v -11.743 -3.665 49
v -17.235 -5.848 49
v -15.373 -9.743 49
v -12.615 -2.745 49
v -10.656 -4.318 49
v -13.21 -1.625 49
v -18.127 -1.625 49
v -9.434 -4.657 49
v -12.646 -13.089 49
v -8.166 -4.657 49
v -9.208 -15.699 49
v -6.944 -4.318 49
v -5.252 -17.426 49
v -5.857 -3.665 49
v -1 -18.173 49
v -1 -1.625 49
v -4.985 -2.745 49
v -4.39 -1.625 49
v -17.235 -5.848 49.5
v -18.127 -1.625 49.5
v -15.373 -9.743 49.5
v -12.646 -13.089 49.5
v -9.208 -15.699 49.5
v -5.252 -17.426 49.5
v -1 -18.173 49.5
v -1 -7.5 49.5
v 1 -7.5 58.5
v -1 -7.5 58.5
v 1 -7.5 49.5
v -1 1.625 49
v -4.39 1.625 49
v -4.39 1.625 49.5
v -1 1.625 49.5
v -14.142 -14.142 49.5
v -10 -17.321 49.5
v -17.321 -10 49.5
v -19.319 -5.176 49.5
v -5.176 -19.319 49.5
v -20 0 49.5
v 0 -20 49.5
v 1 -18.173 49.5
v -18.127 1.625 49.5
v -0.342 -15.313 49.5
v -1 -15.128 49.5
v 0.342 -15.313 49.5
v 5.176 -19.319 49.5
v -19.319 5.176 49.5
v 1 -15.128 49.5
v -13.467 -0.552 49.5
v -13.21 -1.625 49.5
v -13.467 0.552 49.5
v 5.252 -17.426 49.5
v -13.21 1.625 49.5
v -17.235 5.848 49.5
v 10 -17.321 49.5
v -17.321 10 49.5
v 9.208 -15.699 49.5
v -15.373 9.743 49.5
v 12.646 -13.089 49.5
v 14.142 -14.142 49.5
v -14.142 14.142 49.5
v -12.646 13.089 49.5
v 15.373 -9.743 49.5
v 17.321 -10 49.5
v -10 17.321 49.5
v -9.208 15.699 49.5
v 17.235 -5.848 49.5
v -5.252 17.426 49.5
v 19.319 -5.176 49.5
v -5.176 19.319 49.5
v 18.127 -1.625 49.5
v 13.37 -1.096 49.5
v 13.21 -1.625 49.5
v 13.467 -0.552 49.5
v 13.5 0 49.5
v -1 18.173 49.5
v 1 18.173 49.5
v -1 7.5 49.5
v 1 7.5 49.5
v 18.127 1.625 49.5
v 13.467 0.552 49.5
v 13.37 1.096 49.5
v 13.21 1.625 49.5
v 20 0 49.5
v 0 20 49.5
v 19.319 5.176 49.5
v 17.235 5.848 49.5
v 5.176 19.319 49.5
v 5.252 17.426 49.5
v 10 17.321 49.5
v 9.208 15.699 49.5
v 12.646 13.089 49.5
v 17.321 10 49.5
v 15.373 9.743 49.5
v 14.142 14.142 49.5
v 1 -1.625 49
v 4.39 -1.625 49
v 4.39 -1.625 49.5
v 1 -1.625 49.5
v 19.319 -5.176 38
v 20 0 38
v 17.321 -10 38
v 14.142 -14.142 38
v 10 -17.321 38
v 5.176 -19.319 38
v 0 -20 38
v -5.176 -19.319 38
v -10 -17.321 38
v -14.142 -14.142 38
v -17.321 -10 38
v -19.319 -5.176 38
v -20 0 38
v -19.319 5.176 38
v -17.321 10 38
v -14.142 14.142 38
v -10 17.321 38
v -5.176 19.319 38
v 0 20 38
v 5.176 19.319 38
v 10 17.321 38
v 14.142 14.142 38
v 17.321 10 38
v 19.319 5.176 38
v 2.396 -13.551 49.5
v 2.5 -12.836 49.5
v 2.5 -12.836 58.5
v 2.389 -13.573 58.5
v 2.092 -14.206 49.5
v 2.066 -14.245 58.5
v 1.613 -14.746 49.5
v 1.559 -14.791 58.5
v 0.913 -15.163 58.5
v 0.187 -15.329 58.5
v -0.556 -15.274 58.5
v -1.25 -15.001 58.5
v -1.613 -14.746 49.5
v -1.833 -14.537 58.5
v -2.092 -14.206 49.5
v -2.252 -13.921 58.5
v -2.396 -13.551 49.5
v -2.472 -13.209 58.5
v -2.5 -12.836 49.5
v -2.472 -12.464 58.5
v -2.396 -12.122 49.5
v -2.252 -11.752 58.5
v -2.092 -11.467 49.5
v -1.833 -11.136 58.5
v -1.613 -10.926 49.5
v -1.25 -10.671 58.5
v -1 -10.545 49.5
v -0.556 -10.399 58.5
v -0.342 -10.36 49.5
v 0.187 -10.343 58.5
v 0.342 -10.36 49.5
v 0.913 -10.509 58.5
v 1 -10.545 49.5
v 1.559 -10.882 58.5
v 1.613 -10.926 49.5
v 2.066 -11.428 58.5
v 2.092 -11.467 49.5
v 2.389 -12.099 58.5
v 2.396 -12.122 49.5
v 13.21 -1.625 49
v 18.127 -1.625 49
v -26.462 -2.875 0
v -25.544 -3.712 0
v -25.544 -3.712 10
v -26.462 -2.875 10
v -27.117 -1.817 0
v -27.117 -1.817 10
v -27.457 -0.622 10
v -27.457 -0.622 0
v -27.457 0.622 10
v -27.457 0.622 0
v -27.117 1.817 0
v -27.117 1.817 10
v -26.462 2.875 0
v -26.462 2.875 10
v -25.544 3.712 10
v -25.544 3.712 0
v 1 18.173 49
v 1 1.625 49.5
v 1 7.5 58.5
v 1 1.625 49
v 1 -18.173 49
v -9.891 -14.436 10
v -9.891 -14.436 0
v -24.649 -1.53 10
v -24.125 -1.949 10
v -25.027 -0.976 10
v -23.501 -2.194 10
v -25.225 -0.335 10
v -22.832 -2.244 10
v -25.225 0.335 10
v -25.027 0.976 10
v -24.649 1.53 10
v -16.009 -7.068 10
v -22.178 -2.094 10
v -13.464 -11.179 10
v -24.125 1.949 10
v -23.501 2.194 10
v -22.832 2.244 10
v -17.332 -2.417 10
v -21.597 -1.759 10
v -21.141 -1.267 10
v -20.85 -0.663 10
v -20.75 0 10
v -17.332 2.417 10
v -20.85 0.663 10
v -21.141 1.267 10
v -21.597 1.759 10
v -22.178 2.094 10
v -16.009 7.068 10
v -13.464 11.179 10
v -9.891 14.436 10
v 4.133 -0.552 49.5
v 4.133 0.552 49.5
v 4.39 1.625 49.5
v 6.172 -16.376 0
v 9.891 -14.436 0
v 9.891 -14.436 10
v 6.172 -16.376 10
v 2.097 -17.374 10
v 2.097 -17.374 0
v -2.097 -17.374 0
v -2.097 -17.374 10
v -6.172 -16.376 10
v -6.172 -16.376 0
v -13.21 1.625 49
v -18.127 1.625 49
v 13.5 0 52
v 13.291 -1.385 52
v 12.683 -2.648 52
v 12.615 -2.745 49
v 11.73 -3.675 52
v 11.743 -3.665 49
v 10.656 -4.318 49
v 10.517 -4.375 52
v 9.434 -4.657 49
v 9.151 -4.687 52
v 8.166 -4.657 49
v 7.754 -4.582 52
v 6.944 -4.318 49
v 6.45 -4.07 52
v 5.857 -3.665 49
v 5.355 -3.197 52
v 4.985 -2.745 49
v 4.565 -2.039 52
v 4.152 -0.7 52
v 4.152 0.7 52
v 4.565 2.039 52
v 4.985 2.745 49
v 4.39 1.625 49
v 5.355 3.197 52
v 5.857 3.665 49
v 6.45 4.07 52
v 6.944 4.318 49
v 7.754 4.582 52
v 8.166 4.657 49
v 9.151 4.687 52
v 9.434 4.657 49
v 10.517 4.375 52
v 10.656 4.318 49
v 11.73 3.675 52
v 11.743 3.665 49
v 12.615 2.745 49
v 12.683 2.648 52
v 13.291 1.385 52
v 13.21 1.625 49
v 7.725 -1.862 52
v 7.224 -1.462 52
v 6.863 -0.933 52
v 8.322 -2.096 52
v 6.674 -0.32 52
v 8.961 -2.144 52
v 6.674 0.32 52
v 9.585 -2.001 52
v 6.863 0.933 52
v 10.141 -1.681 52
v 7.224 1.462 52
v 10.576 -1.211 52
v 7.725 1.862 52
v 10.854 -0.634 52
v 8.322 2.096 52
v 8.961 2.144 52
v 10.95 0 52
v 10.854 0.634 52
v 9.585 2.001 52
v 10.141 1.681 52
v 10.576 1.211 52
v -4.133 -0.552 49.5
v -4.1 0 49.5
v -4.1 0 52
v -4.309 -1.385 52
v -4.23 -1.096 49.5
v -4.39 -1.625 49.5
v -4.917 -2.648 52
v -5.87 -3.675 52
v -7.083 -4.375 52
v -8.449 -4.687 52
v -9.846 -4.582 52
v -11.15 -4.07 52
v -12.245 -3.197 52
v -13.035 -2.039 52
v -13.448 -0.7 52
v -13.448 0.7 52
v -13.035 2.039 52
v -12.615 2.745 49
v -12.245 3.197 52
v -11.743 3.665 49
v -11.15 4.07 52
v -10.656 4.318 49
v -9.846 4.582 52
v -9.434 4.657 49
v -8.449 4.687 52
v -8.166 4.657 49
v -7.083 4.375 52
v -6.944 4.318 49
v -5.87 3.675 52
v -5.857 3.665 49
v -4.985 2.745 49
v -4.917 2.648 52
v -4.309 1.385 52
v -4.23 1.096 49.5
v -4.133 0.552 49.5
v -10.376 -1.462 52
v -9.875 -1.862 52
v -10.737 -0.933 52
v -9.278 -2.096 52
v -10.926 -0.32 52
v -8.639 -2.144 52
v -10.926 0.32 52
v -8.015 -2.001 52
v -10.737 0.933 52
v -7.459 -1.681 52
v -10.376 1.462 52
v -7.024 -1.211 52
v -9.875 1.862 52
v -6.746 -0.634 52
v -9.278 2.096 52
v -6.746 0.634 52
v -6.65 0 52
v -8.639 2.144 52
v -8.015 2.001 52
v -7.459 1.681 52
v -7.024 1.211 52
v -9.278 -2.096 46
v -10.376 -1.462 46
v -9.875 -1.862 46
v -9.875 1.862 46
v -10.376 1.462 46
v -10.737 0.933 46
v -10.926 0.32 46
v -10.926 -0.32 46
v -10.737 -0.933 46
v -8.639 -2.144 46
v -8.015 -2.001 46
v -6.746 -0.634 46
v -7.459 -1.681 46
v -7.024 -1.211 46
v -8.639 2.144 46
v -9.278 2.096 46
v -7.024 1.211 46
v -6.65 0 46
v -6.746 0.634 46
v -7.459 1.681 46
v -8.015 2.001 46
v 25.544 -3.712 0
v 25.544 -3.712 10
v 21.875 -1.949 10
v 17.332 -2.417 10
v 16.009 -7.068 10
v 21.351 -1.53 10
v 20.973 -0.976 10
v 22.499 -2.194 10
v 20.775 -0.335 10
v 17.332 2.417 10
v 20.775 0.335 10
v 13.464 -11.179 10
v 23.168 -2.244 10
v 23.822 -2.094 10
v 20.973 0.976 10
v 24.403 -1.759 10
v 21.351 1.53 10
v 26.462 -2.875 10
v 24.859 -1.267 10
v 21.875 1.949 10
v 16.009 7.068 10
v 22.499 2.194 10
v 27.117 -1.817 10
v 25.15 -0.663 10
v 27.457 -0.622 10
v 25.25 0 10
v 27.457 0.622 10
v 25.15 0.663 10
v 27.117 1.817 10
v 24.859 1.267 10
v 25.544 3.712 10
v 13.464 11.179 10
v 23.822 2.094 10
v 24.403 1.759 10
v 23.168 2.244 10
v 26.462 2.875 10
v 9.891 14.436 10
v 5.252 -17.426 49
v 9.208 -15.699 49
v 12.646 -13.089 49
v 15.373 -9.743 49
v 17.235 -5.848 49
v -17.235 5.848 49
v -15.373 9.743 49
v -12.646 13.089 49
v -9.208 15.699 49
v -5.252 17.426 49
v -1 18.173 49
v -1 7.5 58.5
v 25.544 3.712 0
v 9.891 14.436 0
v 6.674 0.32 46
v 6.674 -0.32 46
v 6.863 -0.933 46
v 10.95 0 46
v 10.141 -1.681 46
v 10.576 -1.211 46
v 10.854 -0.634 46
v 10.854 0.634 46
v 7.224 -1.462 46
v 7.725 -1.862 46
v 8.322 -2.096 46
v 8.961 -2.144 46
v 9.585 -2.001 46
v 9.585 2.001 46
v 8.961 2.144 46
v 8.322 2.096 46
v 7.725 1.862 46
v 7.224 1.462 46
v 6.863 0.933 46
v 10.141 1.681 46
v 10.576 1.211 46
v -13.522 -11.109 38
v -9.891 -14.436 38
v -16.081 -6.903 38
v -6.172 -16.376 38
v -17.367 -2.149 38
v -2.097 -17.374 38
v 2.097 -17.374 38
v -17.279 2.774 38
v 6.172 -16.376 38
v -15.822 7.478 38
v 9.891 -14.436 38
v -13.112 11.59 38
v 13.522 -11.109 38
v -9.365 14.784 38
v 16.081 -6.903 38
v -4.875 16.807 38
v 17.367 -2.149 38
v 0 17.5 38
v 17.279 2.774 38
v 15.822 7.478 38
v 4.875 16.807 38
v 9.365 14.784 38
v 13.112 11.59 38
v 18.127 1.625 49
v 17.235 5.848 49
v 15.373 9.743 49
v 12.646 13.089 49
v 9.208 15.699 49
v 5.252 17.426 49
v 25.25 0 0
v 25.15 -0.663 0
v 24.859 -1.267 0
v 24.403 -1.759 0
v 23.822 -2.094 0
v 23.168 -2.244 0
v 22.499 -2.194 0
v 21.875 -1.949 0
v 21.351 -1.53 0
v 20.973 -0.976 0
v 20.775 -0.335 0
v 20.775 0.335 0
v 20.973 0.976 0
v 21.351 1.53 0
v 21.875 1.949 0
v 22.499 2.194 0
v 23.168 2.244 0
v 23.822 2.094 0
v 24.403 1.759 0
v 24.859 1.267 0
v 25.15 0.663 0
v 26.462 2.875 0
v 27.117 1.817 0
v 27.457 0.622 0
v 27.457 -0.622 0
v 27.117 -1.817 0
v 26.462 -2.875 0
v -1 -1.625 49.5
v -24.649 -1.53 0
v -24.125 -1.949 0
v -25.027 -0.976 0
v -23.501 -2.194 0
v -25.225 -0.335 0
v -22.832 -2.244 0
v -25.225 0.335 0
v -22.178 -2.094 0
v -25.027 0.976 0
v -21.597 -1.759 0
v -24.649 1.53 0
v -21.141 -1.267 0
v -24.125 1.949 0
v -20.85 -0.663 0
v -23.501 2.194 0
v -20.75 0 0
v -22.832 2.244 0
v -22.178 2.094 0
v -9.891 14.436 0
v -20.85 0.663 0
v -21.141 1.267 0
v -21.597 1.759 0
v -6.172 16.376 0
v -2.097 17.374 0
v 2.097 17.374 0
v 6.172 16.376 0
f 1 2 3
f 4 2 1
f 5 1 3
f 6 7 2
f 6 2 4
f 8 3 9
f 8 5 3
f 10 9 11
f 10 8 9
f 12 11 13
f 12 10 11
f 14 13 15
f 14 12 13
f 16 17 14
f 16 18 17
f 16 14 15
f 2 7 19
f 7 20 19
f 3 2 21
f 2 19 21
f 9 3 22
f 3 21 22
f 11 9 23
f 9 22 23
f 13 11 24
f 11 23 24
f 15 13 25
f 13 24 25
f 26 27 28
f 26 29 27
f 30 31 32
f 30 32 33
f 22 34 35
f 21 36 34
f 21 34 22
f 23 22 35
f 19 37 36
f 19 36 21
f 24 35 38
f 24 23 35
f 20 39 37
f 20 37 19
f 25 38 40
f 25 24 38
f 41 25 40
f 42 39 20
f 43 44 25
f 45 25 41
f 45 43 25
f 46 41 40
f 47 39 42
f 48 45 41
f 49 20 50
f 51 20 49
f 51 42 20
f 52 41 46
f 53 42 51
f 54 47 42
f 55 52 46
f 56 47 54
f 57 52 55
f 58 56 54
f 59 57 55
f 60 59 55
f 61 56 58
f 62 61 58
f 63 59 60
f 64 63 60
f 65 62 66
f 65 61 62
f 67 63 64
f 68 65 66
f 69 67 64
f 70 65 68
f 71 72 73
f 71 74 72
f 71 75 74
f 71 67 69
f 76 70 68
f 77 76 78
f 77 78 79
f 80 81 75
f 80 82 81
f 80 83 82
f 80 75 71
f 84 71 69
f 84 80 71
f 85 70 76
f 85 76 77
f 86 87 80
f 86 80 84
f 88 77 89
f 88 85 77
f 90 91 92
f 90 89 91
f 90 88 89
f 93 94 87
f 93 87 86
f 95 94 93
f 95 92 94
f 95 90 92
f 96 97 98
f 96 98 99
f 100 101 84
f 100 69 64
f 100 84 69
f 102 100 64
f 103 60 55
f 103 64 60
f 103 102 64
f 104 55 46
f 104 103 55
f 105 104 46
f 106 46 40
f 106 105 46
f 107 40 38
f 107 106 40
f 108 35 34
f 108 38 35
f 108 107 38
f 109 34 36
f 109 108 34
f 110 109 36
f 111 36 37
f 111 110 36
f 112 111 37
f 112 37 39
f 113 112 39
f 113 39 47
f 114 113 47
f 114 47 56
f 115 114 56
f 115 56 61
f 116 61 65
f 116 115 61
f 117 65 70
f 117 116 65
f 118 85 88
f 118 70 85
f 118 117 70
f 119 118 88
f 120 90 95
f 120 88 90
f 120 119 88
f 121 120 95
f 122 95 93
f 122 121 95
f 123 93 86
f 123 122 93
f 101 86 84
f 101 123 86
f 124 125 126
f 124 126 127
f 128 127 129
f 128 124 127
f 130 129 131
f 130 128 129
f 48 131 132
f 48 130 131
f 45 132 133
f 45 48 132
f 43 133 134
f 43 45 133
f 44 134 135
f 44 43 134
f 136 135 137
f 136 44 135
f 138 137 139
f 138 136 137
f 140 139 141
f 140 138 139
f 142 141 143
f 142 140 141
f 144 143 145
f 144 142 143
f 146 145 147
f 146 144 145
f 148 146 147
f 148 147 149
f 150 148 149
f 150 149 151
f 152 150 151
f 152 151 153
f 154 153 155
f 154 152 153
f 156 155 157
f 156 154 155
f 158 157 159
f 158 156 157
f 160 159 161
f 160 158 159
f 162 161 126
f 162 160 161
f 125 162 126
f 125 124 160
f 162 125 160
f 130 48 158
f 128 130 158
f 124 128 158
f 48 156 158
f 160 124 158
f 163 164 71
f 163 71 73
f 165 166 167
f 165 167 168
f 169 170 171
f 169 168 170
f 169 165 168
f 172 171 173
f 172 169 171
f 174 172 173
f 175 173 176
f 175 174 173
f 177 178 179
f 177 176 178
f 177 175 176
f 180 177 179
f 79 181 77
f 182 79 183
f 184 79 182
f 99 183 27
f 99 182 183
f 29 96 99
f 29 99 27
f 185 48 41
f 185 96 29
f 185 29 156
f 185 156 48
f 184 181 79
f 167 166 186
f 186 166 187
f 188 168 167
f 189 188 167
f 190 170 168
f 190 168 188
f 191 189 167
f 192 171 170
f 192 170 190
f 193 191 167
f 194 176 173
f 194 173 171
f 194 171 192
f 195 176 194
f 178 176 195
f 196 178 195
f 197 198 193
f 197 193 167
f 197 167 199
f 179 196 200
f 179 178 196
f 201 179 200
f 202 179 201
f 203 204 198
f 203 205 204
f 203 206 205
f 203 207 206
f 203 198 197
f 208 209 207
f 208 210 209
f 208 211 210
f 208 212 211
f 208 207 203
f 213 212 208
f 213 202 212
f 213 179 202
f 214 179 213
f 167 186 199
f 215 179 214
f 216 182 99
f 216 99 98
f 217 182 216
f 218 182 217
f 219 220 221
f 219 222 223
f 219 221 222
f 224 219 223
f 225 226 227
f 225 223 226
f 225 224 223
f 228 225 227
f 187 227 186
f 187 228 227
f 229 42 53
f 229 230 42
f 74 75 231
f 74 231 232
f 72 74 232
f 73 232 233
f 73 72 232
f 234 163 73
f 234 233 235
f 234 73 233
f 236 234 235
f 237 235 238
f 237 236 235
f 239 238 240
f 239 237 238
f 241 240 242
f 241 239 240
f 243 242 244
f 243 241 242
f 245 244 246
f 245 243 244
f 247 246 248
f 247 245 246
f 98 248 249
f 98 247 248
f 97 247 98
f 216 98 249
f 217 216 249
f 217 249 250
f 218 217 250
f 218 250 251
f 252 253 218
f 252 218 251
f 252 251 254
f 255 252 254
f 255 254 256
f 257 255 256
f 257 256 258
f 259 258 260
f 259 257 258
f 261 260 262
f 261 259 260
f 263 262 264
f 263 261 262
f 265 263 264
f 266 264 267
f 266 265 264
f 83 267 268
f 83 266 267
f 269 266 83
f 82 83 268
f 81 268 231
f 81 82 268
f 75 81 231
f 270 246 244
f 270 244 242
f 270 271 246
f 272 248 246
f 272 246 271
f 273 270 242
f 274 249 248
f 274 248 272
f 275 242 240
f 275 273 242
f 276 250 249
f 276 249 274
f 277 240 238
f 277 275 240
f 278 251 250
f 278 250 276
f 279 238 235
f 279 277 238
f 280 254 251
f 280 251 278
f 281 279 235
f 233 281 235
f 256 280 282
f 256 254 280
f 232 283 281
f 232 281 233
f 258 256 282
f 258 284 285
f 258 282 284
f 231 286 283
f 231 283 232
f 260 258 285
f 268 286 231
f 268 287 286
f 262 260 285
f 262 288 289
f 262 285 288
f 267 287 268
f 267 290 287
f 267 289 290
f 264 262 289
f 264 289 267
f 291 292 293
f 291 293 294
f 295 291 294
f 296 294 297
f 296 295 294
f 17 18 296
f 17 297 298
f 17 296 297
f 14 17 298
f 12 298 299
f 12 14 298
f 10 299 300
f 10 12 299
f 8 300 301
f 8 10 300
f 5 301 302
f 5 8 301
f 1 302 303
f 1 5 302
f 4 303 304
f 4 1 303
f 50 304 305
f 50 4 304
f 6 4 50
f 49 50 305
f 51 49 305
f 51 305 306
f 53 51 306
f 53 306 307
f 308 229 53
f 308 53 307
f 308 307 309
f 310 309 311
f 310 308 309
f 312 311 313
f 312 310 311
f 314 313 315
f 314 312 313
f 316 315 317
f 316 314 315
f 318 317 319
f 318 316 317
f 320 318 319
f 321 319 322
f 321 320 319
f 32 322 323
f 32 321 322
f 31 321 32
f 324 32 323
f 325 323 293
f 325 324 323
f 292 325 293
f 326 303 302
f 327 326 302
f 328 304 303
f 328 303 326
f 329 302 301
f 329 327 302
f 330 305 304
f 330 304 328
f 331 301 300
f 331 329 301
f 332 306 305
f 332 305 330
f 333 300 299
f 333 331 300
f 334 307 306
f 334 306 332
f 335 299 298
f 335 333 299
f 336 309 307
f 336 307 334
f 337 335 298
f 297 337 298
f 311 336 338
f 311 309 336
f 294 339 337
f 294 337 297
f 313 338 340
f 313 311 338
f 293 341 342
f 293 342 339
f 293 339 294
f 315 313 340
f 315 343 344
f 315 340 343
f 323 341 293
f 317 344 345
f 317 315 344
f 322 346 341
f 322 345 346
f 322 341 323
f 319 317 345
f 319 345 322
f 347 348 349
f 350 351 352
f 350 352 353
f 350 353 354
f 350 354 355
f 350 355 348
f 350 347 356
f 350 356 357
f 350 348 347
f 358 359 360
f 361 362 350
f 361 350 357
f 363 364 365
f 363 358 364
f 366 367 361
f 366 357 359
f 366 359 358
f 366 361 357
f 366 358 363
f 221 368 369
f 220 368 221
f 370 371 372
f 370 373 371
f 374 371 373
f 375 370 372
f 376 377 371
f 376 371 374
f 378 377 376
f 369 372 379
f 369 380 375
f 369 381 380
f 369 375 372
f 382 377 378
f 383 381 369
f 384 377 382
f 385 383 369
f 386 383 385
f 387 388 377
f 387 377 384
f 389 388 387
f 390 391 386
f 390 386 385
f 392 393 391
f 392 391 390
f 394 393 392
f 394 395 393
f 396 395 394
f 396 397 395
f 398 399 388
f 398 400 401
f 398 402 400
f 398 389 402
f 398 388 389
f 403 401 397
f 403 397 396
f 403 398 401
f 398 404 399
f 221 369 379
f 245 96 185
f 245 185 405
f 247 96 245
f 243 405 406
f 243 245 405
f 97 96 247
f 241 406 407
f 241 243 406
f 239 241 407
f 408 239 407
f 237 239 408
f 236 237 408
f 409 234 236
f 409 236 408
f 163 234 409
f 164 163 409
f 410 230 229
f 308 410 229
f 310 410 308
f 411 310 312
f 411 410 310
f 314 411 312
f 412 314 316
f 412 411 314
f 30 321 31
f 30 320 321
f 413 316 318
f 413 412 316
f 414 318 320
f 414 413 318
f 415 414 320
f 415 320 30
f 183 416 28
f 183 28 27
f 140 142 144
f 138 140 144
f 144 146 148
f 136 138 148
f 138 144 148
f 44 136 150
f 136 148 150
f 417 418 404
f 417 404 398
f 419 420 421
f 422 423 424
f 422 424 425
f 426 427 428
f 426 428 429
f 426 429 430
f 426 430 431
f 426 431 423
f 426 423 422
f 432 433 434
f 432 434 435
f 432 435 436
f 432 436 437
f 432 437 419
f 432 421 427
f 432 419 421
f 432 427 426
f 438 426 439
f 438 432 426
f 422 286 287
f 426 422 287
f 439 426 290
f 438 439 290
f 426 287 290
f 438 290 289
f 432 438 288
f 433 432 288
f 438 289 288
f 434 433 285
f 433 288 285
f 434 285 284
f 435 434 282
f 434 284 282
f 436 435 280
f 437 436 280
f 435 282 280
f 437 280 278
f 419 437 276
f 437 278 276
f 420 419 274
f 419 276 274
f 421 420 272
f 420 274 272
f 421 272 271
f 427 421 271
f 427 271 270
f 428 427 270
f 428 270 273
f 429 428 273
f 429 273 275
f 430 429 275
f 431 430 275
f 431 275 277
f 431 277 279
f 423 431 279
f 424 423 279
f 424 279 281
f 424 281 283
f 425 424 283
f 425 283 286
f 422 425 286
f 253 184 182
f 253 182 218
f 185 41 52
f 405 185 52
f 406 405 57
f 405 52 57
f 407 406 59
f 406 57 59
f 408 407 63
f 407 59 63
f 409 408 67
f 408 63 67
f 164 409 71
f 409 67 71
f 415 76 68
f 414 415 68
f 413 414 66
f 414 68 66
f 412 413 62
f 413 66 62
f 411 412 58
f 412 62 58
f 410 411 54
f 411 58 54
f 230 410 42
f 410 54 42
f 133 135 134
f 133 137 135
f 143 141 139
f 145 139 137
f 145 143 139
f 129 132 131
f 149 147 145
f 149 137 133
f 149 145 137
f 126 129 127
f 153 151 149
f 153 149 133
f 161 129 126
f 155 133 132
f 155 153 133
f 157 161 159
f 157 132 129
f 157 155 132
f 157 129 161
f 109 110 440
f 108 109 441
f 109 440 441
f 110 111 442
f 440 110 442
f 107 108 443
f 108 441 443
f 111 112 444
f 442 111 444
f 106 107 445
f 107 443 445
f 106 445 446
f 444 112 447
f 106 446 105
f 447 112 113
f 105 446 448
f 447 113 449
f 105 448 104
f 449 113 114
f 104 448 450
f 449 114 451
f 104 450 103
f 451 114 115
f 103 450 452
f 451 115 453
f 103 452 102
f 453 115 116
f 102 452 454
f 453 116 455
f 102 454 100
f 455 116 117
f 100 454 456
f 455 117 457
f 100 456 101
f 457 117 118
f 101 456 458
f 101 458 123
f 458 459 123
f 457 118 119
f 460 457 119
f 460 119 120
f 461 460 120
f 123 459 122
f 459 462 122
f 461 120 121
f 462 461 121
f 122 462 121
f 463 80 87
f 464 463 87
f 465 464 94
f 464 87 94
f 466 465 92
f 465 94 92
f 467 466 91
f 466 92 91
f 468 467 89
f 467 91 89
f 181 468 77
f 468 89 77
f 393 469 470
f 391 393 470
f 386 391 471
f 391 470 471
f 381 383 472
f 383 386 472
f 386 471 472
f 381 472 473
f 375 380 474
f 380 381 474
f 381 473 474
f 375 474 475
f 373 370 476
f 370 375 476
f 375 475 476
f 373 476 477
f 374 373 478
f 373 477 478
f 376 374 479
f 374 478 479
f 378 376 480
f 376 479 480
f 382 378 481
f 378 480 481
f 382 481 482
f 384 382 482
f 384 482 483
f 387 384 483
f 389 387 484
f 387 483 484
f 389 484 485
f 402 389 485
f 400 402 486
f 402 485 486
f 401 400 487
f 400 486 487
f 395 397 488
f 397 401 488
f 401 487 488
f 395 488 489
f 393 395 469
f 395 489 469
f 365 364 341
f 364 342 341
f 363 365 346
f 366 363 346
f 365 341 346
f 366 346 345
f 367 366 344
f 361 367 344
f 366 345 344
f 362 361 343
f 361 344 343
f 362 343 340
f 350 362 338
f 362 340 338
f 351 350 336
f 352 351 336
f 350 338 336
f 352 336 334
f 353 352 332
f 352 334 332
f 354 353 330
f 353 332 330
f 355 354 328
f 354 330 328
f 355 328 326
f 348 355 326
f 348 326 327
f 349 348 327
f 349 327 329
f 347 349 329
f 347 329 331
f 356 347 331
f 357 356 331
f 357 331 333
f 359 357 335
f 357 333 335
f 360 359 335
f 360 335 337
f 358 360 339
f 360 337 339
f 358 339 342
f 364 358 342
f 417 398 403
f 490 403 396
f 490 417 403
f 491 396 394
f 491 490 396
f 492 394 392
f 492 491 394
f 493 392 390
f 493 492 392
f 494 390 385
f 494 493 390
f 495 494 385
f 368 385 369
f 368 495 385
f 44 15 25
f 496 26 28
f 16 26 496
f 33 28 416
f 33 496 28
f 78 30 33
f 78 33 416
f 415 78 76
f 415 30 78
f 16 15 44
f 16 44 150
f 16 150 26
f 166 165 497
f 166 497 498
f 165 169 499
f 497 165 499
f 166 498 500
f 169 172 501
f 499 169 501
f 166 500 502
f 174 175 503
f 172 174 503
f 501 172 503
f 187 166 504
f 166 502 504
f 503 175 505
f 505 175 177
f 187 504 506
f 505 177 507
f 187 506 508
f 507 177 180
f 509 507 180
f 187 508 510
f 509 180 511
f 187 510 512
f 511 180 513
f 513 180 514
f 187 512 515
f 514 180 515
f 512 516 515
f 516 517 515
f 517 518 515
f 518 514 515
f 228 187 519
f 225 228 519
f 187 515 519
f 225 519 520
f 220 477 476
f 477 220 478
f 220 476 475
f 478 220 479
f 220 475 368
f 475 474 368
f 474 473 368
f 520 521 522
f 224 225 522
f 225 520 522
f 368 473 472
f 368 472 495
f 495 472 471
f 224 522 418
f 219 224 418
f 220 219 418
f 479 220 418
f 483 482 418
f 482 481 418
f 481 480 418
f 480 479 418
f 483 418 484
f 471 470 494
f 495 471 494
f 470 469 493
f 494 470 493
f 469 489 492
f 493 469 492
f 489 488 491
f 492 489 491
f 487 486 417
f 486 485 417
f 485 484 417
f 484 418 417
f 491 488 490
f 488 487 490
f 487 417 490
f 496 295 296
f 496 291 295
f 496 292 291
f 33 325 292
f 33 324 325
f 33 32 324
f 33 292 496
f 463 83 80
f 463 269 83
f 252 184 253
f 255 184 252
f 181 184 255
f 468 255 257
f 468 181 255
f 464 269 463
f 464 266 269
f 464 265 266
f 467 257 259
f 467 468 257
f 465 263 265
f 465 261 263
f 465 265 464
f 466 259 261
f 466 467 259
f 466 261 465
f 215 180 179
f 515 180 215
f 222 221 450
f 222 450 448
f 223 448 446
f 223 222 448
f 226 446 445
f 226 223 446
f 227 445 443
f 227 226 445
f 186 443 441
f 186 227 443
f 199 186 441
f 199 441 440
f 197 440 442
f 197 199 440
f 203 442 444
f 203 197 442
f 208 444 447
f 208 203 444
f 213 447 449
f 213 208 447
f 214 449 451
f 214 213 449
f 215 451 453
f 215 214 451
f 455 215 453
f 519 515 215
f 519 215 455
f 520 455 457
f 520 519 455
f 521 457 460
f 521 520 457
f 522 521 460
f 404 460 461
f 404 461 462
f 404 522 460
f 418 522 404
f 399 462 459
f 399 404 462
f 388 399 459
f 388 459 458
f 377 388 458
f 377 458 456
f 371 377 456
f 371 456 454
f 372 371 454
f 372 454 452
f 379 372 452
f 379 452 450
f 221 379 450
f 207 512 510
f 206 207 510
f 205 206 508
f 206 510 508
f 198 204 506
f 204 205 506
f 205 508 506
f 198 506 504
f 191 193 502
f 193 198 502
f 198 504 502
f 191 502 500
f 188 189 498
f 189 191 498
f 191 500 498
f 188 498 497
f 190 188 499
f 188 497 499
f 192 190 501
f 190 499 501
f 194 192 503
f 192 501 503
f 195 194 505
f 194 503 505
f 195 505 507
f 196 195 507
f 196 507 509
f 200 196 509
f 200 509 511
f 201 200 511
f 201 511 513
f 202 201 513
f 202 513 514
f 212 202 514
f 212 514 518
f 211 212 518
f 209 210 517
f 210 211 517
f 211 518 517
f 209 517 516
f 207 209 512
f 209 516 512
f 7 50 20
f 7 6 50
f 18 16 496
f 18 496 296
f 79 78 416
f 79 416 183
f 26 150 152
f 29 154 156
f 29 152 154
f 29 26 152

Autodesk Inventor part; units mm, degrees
ref_plane "YZ Plane" through (0, 0, 0) normal (1, 0, 0) x (0, 1, 0)
ref_plane "XZ Plane" through (0, 0, 0) normal (0, 1, 0) x (-1, 0, 0)
ref_plane "XY Plane" through (0, 0, 0) normal (0, 0, 1) x (1, 0, 0)
sketch "Base" plane through (0, 0, 0) normal (0, 0, 1) x (1, 0, 0)
  circle A0 centre (0, 0) radius 17.5
  circle A1 centre (23, 0) radius 2.25
  line L0 (-38.5, 0) -> (38.5, 0) construction
  line L1 (0, -24.5) -> (0, 24.5) construction
  circle A2 centre (-23, 0) radius 2.25
  circle A3 centre (23, 0) radius 4.5
  circle A4 centre (-23, 0) radius 4.5
  line L2 (-27.5, 0) -> (27.5, 0) construction
  line L3 (9.8913, 14.4365) -> (25.5435, 3.7122)
  line L4 (25.5435, -3.7122) -> (9.8913, -14.4365)
  line L5 (-25.5435, 3.7122) -> (-9.8913, 14.4365)
  line L6 (-25.5435, -3.7122) -> (-9.8913, -14.4365)
  dimension "d0" = 35
  dimension "d1" = 4.5
  dimension "d2" = 2.25
  dimension "d3" = 46
  dimension "d4" = 55
extrude "BaseFeature" add sketch "Base" along normal blind 10
sketch "Body" plane through (0, 0, 10) normal (0, 0, 1) x (1, 0, 0)
  circle A0 centre (0, 0) radius 17.5
  arc A1 (-9.8913, -14.4365) -> (9.8913, -14.4365) centre (0, 0) ccw projected
extrude "BodyFeature" add sketch "Body" along normal blind 28
sketch "Head" plane through (0, 0, 38) normal (0, 0, 1) x (1, 0, 0)
  circle A0 centre (0, 0) radius 20
  dimension "d9" = 40
extrude "HeadFeature" add sketch "Head" along normal blind 11.5
sketch "Top" plane through (0, 0, 49.5) normal (0, 0, 1) x (1, 0, 0)
  circle A0 centre (0, 0) radius 18.2
  circle A1 centre (0, 0) radius 20 projected
  dimension "d12" = 1.8
extrude "TopFeature" cut sketch "Top" against normal blind 0.5 contours A0
sketch "Sketch5" plane through (0, 0, 49) normal (0, 0, 1) x (1, 0, 0)
  line L0 (-38.5, 0) -> (38.5, 0) construction
  circle A0 centre (8.8, 0) radius 4.7
  line L1 (0, -28) -> (0, 28) construction
  circle A1 centre (-8.8, 0) radius 4.7
  line L2 (8.8, 0) -> (13.5, 0) construction
  line L3 (-8.8, 0) -> (-13.5, 0) construction
  point P0 (0, 0)
  dimension "d15" = 9.4
  dimension "d16" = 27
extrude "Extrusion5" add sketch "Sketch5" along normal blind 3
sketch "Sketch6" plane through (8.8, 0, 52) normal (0, 0, 1) x (1, 0, 0)
  circle A0 centre (0, 0) radius 4.7 projected
  circle A1 centre (-17.6, 0) radius 4.7 projected
  circle A2 centre (-17.6, 0) radius 4.7 projected
  circle A3 centre (-17.6, 0) radius 2.15
  circle A4 centre (0, 0) radius 2.15
  point P0 (-8.8, 0)
  dimension "d19" = 4.3
extrude "Extrusion6" cut sketch "Sketch6" against normal blind 6 contours A3 | A4
sketch "Sketch7" plane through (0, 0, 49) normal (0, 0, 1) x (1, 0, 0)
  circle A0 centre (-8.8, 0) radius 4.7 projected
  circle A1 centre (8.8, 0) radius 4.7 projected
  circle A2 centre (0, 0) radius 18.2 projected
  line L0 (-18.2, 1.625) -> (18.2, 1.625)
  line L1 (18.2, 1.625) -> (18.2, -1.625)
  line L2 (18.2, -1.625) -> (-18.2, -1.625)
  line L3 (-18.2, -1.625) -> (-18.2, 1.625)
  line L4 (-38.5, 0) -> (38.5, 0) construction
  circle A3 centre (0, 0) radius 18.2 projected
  point P0 (-18.2, 0)
  point P1 (13.2101, -1.625)
  point P2 (18.1273, -1.625)
  point P3 (18.1273, 1.625)
  point P4 (13.2101, 1.625)
  point P5 (-4.3899, -1.625)
  point P6 (4.3899, -1.625)
  point P7 (4.3899, 1.625)
  point P8 (-4.3899, 1.625)
  point P9 (-18.1273, -1.625)
  point P10 (-13.2101, -1.625)
  point P11 (-13.2101, 1.625)
  point P12 (-18.1273, 1.625)
  dimension "d22" = 3.25
extrude "Extrusion7" add sketch "Sketch7" along normal up to surface (0.5 mm away) contours A0 L0 A1 L2 | A0 L2 A2 L0 | L0 A2 L2 A1
sketch "Sketch8" plane through (0, 0, 49) normal (0, 0, 1) x (1, 0, 0)
  line L0 (0, -28) -> (0, 28) construction
  line L1 (-1, 18.2) -> (1, 18.2)
  line L2 (1, 18.2) -> (1, -18.2)
  line L3 (1, -18.2) -> (-1, -18.2)
  line L4 (-1, -18.2) -> (-1, 18.2)
  arc A0 (18.1273, 1.625) -> (-18.1273, 1.625) centre (0, 0) ccw projected
  arc A1 (-18.1273, -1.625) -> (18.1273, -1.625) centre (0, 0) ccw projected
  point P0 (0, 18.2)
  dimension "d25" = 2
extrude "Extrusion8" add sketch "Sketch8" along normal up to surface (0.5 mm away)
sketch "Sketch9" plane through (0, 0, 49.5) normal (0, 0, 1) x (1, 0, 0)
  line L0 (0, -28) -> (0, 28) construction
  circle A0 centre (0, -12.8363) radius 2.5
  line L1 (-1, 1.625) -> (-1, 18.1725) projected
  line L2 (1, -1.625) -> (1, -18.1725) projected
  line L3 (-1, 7.5) -> (1, 7.5)
  line L4 (1, 7.5) -> (1, -7.5)
  line L5 (1, -7.5) -> (-1, -7.5)
  line L6 (-1, -7.5) -> (-1, 7.5)
  line L7 (-38.5, 0) -> (38.5, 0) construction
  line L8 (0, -7.5) -> (0, -18.1725) construction
  point P0 (0, 0)
  point P1 (1, 0)
  dimension "d28" = 5
  dimension "d29" = 15
  dimension "d30" = 5.3362
  dimension "d31" = 5.3362
extrude "Extrusion9" add sketch "Sketch9" along normal blind 9
equation "\"d26\" = d25"
properties part number "HiitioContactor"
